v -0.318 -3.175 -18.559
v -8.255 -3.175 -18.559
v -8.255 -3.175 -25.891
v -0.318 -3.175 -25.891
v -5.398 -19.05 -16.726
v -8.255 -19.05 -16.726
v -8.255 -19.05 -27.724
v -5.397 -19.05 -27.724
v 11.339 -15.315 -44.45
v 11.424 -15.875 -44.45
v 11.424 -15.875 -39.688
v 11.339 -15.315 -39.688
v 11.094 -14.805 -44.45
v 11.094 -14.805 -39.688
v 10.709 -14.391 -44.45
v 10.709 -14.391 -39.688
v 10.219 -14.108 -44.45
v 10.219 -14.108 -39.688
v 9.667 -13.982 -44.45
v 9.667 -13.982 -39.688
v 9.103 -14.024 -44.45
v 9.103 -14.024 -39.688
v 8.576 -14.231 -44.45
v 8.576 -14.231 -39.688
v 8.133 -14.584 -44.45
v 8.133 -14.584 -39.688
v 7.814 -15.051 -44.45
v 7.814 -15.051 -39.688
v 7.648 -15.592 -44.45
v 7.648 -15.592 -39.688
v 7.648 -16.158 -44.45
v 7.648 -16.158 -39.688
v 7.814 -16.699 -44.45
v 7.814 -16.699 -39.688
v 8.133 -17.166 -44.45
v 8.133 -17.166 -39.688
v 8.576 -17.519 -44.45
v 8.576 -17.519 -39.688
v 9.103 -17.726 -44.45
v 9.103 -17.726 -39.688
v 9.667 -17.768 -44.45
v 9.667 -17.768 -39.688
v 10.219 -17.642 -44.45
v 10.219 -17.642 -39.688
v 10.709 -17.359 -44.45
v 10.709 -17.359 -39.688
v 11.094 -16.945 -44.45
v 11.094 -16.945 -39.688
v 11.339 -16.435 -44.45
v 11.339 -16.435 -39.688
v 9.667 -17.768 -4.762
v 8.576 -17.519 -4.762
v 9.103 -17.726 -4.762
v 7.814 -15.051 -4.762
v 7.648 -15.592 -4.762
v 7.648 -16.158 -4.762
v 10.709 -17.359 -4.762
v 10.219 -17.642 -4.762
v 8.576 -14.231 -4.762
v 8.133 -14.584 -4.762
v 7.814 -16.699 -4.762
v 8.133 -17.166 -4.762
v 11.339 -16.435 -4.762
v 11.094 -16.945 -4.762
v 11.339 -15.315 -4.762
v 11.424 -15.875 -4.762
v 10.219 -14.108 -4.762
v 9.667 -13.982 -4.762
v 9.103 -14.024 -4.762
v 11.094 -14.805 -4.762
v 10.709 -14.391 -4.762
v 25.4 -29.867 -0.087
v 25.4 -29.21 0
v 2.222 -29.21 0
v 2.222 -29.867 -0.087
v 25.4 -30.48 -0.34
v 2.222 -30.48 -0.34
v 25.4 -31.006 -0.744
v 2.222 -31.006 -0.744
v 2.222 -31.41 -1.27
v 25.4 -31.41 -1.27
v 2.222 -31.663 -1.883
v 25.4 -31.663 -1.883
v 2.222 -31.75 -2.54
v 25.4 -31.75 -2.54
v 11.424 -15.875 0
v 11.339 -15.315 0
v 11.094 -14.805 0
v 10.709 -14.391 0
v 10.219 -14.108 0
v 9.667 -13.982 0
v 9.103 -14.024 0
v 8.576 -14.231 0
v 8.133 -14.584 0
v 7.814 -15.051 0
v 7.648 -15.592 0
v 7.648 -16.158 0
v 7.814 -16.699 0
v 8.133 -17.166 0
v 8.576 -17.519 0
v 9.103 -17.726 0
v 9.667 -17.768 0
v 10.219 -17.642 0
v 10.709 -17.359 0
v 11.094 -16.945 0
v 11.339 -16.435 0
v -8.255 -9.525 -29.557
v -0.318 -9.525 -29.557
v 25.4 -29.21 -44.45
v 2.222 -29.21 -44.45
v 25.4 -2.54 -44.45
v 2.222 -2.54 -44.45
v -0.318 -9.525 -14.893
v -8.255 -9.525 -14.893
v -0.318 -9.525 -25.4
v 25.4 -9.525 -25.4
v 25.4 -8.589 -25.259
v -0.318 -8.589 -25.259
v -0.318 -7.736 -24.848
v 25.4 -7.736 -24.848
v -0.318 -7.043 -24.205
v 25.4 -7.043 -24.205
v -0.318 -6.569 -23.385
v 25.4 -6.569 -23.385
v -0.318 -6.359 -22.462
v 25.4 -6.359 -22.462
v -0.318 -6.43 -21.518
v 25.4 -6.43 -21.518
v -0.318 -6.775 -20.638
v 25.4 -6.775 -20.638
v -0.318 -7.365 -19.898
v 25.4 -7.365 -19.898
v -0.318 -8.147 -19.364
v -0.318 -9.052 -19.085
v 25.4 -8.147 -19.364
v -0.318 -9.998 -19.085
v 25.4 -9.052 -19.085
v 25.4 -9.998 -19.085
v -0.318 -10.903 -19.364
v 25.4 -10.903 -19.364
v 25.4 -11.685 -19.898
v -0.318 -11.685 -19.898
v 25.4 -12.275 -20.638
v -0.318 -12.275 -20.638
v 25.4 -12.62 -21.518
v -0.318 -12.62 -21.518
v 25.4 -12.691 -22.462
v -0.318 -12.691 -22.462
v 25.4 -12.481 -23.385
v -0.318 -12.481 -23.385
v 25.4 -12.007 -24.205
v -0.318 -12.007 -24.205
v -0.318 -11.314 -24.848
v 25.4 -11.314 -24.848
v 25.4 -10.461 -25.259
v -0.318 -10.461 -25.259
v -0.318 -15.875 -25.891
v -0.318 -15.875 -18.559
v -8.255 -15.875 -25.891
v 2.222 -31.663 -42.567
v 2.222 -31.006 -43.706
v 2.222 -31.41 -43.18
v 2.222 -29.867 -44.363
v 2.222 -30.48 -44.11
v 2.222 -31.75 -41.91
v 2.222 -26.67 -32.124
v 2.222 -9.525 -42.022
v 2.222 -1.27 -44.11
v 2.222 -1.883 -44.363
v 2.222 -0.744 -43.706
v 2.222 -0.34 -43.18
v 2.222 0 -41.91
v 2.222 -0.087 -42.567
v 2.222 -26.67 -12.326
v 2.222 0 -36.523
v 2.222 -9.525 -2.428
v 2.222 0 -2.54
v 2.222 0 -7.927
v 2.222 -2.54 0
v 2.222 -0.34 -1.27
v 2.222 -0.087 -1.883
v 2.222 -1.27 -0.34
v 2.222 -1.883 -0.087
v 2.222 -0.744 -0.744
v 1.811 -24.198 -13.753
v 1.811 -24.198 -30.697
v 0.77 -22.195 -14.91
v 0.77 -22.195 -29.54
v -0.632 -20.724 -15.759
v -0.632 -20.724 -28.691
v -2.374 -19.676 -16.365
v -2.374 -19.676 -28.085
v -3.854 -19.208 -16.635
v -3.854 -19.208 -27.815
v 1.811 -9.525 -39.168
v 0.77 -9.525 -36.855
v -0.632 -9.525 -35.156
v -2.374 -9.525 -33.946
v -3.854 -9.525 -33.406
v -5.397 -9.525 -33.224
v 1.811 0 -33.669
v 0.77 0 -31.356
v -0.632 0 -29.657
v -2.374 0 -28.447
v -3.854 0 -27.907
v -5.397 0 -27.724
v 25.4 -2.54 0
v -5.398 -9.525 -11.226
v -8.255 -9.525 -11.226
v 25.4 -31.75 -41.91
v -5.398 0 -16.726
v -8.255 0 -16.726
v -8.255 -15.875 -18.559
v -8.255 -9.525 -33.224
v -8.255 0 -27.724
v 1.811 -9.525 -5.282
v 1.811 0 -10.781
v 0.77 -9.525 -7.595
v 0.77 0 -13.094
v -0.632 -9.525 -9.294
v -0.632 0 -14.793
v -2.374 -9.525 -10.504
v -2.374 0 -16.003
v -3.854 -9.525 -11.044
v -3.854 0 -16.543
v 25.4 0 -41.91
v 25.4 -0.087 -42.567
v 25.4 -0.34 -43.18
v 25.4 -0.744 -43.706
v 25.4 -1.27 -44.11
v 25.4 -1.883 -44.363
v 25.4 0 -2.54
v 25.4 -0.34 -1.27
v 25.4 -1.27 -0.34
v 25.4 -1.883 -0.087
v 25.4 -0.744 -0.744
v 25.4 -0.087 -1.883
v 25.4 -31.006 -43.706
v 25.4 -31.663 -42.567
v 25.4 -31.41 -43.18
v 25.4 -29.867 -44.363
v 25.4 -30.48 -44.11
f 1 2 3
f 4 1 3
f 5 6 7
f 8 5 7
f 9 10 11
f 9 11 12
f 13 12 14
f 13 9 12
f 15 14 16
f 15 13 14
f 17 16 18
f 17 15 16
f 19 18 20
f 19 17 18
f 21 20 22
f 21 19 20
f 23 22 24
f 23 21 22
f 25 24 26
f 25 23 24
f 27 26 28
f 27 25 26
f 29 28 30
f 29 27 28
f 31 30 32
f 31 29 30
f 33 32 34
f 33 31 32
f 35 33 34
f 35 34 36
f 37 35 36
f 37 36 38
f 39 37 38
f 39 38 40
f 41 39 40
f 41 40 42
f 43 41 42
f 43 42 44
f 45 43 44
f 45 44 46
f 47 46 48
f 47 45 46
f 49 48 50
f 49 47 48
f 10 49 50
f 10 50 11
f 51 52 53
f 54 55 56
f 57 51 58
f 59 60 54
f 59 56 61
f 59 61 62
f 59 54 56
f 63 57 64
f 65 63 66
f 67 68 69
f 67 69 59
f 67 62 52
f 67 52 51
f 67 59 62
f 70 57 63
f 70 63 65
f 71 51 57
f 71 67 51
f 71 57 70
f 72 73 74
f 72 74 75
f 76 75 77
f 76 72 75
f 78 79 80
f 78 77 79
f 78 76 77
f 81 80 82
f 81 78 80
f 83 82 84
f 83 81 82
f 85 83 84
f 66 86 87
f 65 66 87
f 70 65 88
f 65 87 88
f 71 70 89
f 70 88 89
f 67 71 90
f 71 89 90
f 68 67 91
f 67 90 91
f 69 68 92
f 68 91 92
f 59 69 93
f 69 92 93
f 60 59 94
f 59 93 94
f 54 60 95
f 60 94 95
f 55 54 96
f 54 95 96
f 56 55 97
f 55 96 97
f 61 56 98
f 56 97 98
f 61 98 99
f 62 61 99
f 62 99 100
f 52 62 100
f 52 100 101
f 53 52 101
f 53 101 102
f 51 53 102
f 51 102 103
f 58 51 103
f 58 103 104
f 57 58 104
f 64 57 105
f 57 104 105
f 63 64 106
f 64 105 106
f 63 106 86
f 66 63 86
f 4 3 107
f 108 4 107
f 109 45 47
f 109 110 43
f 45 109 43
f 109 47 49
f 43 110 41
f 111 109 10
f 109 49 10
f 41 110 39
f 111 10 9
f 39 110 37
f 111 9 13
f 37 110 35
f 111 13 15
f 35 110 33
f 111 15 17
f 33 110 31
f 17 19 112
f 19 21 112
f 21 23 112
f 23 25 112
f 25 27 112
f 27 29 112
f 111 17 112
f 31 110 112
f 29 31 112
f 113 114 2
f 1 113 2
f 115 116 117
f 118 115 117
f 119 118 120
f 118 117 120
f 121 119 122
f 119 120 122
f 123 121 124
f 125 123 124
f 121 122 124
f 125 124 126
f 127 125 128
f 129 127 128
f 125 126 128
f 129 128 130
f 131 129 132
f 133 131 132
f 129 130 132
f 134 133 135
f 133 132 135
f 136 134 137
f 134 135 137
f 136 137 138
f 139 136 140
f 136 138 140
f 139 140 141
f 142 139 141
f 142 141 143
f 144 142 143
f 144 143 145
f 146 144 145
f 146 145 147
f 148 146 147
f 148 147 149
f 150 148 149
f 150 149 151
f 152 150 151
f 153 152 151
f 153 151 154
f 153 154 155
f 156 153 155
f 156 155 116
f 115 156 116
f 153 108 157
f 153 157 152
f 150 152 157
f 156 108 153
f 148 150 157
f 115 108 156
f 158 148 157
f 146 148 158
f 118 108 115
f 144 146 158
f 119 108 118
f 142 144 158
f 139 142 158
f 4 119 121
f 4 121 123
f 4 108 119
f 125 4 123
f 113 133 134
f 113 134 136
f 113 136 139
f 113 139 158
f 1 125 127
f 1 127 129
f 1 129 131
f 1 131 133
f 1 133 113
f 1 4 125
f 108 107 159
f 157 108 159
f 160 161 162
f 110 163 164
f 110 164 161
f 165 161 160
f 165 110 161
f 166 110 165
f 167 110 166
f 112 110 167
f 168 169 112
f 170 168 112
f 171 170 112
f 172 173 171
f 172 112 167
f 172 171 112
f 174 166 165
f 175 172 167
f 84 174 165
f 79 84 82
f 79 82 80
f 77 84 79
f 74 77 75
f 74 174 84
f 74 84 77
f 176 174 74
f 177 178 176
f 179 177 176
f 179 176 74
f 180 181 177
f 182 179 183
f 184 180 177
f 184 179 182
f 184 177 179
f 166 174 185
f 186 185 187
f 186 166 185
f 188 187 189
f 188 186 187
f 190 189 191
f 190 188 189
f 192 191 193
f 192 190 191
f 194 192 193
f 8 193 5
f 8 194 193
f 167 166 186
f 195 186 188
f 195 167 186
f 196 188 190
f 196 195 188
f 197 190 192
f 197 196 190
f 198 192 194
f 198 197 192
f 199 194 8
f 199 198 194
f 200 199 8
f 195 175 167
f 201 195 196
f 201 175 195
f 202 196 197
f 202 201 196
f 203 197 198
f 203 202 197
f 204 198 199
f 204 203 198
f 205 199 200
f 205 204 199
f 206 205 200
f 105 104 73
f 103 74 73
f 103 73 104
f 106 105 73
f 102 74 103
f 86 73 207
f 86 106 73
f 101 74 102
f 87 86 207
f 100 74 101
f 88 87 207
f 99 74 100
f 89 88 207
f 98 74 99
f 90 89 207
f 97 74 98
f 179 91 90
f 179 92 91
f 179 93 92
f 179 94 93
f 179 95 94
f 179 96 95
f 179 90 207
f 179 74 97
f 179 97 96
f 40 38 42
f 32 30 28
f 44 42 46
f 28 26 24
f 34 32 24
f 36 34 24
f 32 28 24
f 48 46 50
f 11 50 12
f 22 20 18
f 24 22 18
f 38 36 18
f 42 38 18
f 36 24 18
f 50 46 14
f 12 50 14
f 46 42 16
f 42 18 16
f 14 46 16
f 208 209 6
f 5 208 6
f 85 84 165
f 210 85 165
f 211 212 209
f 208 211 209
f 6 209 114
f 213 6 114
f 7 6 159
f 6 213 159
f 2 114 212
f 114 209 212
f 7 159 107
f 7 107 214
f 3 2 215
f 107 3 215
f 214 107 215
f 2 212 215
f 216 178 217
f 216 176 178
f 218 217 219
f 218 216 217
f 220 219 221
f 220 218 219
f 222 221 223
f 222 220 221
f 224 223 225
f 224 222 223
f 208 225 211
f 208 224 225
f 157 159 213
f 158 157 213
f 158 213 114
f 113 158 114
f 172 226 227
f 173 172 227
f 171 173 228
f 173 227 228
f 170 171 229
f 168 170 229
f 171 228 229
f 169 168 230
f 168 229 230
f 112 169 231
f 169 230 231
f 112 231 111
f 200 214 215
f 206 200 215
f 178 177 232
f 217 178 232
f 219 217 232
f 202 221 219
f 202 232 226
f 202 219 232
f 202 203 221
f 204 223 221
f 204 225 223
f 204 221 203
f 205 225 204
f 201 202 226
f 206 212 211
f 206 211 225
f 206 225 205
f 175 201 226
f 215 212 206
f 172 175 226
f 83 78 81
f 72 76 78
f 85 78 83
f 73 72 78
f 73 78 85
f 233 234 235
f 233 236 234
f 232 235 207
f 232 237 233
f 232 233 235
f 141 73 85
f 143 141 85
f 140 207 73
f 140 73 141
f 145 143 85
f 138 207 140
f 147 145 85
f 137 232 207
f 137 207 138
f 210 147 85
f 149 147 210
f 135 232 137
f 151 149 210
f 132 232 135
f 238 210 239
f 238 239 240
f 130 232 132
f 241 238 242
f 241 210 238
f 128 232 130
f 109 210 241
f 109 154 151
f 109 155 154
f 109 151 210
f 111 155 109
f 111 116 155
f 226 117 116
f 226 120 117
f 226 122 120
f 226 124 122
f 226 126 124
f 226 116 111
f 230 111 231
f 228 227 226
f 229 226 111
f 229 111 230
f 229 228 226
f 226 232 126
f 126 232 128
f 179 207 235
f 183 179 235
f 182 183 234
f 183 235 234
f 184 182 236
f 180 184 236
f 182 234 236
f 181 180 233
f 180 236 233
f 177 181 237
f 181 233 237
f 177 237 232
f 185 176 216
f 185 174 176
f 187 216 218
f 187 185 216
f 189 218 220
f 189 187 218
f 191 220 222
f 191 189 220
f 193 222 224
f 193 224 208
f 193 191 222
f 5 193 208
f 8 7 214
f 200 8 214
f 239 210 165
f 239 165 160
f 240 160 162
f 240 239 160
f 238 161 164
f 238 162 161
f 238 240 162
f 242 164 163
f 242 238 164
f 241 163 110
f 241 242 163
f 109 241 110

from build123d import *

# Parameters (mm, degrees)
BOSS_EXTRUDE1_DEPTH      = 25.4
BOSS_EXTRUDE1_DEPTH_BACK = 8.255
SKETCH1_W                = 44.45
SKETCH1_H                = 31.75
CUT_EXTRUDE1_DEPTH       = 7.9375
SKETCH3_R                = 3.175
CUT_EXTRUDE2_DEPTH       = 65.160143586
SKETCH4_R                = 1.89865
CUT_EXTRUDE4_DEPTH       = 4.7625
FILLET1_R                = 2.54
CUT_EXTRUDE5_DEPTH       = 10.4775
FILLET2_R                = 7.62


with BuildPart() as part:
    # Sketch1 → Boss-Extrude1 (new, two sides: drawn at the far end of the back side and taken through both)
    with BuildSketch(Plane(origin=(0, 0, 0), x_dir=(0, 0, -1), z_dir=(1, 0, 0)).offset(-BOSS_EXTRUDE1_DEPTH_BACK)):
        with Locations((22.225, -15.875)):
            Rectangle(SKETCH1_W, SKETCH1_H)
    extrude(amount=BOSS_EXTRUDE1_DEPTH + BOSS_EXTRUDE1_DEPTH_BACK)

    # Sketch2 → Cut-Extrude1 (cut)
    with BuildSketch(Plane.ZY.offset(8.255)):
        Polygon((-18.558825791, -15.875), (-14.892651581, -9.525), (-18.558825791, -3.175), (-25.891174209, -3.175), (-29.557348419, -9.525), (-25.891174209, -15.875), align=None)
    extrude(amount=-CUT_EXTRUDE1_DEPTH, mode=Mode.SUBTRACT)

    # Sketch3 → Cut-Extrude2 (cut, through all)
    with BuildSketch(Plane(origin=(25.4, 0, 0), x_dir=(0, 0, -1), z_dir=(1, 0, 0))):
        with Locations((22.225, -9.525)):
            Circle(SKETCH3_R)
    extrude(amount=-CUT_EXTRUDE2_DEPTH, mode=Mode.SUBTRACT)

    # Sketch4 → Cut-Extrude4 (cut)
    with BuildSketch(Plane.XY):
        with Locations((9.525, -15.875)):
            Circle(SKETCH4_R)
    cut_extrude4 = extrude(amount=-CUT_EXTRUDE4_DEPTH, mode=Mode.SUBTRACT)

    # Mirror3: Cut-Extrude4 across plane
    add(cut_extrude4.mirror(Plane.XY.offset(-22.225)), mode=Mode.SUBTRACT)

    # Fillet1
    fillet1_edges = [part.edges().sort_by_distance(p)[0] for p in [
        (8.5725, 0, 0),
        (8.5725, 0, -44.45),
        (8.5725, -31.75, -44.45),
        (8.5725, -31.75, 0),
    ]]
    fillet(fillet1_edges, radius=FILLET1_R)

    # Sketch5 → Cut-Extrude5 (cut)
    with BuildSketch(Plane.ZY.offset(8.255)):
        with BuildLine():
            Line((-44.45, -2.54), (-44.45, -29.21))
            ThreePointArc((-44.45, -29.21), (-43.706051224, -31.006051224), (-41.91, -31.75))
            Line((-41.91, -31.75), (-2.54, -31.75))
            ThreePointArc((-2.54, -31.75), (-0.743948776, -31.006051224), (0, -29.21))
            Line((0, -29.21), (0, -2.54))
            ThreePointArc((0, -2.54), (-0.743948776, -0.743948776), (-2.54, 0))
            Line((-2.54, 0), (-16.725738686, 0))
            Line((-16.725738686, 0), (-11.226477372, -9.525))
            Line((-11.226477372, -9.525), (-16.725738686, -19.05))
            Line((-16.725738686, -19.05), (-27.724261314, -19.05))
            Line((-27.724261314, -19.05), (-33.223522628, -9.525))
            Line((-33.223522628, -9.525), (-27.724261314, 0))
            Line((-27.724261314, 0), (-41.91, 0))
            ThreePointArc((-41.91, 0), (-43.706051224, -0.743948776), (-44.45, -2.54))
        make_face()
    extrude(amount=-CUT_EXTRUDE5_DEPTH, mode=Mode.SUBTRACT)

    # Fillet2
    fillet2_edges = [part.edges().sort_by_distance(p)[0] for p in [
        (2.2225, -4.7625, -30.473891971),
        (2.2225, -14.2875, -30.473891971),
        (2.2225, -19.05, -22.225),
        (2.2225, -14.2875, -13.976108029),
        (2.2225, -4.7625, -13.976108029),
    ]]
    fillet(fillet2_edges, radius=FILLET2_R)


solid = part.part
